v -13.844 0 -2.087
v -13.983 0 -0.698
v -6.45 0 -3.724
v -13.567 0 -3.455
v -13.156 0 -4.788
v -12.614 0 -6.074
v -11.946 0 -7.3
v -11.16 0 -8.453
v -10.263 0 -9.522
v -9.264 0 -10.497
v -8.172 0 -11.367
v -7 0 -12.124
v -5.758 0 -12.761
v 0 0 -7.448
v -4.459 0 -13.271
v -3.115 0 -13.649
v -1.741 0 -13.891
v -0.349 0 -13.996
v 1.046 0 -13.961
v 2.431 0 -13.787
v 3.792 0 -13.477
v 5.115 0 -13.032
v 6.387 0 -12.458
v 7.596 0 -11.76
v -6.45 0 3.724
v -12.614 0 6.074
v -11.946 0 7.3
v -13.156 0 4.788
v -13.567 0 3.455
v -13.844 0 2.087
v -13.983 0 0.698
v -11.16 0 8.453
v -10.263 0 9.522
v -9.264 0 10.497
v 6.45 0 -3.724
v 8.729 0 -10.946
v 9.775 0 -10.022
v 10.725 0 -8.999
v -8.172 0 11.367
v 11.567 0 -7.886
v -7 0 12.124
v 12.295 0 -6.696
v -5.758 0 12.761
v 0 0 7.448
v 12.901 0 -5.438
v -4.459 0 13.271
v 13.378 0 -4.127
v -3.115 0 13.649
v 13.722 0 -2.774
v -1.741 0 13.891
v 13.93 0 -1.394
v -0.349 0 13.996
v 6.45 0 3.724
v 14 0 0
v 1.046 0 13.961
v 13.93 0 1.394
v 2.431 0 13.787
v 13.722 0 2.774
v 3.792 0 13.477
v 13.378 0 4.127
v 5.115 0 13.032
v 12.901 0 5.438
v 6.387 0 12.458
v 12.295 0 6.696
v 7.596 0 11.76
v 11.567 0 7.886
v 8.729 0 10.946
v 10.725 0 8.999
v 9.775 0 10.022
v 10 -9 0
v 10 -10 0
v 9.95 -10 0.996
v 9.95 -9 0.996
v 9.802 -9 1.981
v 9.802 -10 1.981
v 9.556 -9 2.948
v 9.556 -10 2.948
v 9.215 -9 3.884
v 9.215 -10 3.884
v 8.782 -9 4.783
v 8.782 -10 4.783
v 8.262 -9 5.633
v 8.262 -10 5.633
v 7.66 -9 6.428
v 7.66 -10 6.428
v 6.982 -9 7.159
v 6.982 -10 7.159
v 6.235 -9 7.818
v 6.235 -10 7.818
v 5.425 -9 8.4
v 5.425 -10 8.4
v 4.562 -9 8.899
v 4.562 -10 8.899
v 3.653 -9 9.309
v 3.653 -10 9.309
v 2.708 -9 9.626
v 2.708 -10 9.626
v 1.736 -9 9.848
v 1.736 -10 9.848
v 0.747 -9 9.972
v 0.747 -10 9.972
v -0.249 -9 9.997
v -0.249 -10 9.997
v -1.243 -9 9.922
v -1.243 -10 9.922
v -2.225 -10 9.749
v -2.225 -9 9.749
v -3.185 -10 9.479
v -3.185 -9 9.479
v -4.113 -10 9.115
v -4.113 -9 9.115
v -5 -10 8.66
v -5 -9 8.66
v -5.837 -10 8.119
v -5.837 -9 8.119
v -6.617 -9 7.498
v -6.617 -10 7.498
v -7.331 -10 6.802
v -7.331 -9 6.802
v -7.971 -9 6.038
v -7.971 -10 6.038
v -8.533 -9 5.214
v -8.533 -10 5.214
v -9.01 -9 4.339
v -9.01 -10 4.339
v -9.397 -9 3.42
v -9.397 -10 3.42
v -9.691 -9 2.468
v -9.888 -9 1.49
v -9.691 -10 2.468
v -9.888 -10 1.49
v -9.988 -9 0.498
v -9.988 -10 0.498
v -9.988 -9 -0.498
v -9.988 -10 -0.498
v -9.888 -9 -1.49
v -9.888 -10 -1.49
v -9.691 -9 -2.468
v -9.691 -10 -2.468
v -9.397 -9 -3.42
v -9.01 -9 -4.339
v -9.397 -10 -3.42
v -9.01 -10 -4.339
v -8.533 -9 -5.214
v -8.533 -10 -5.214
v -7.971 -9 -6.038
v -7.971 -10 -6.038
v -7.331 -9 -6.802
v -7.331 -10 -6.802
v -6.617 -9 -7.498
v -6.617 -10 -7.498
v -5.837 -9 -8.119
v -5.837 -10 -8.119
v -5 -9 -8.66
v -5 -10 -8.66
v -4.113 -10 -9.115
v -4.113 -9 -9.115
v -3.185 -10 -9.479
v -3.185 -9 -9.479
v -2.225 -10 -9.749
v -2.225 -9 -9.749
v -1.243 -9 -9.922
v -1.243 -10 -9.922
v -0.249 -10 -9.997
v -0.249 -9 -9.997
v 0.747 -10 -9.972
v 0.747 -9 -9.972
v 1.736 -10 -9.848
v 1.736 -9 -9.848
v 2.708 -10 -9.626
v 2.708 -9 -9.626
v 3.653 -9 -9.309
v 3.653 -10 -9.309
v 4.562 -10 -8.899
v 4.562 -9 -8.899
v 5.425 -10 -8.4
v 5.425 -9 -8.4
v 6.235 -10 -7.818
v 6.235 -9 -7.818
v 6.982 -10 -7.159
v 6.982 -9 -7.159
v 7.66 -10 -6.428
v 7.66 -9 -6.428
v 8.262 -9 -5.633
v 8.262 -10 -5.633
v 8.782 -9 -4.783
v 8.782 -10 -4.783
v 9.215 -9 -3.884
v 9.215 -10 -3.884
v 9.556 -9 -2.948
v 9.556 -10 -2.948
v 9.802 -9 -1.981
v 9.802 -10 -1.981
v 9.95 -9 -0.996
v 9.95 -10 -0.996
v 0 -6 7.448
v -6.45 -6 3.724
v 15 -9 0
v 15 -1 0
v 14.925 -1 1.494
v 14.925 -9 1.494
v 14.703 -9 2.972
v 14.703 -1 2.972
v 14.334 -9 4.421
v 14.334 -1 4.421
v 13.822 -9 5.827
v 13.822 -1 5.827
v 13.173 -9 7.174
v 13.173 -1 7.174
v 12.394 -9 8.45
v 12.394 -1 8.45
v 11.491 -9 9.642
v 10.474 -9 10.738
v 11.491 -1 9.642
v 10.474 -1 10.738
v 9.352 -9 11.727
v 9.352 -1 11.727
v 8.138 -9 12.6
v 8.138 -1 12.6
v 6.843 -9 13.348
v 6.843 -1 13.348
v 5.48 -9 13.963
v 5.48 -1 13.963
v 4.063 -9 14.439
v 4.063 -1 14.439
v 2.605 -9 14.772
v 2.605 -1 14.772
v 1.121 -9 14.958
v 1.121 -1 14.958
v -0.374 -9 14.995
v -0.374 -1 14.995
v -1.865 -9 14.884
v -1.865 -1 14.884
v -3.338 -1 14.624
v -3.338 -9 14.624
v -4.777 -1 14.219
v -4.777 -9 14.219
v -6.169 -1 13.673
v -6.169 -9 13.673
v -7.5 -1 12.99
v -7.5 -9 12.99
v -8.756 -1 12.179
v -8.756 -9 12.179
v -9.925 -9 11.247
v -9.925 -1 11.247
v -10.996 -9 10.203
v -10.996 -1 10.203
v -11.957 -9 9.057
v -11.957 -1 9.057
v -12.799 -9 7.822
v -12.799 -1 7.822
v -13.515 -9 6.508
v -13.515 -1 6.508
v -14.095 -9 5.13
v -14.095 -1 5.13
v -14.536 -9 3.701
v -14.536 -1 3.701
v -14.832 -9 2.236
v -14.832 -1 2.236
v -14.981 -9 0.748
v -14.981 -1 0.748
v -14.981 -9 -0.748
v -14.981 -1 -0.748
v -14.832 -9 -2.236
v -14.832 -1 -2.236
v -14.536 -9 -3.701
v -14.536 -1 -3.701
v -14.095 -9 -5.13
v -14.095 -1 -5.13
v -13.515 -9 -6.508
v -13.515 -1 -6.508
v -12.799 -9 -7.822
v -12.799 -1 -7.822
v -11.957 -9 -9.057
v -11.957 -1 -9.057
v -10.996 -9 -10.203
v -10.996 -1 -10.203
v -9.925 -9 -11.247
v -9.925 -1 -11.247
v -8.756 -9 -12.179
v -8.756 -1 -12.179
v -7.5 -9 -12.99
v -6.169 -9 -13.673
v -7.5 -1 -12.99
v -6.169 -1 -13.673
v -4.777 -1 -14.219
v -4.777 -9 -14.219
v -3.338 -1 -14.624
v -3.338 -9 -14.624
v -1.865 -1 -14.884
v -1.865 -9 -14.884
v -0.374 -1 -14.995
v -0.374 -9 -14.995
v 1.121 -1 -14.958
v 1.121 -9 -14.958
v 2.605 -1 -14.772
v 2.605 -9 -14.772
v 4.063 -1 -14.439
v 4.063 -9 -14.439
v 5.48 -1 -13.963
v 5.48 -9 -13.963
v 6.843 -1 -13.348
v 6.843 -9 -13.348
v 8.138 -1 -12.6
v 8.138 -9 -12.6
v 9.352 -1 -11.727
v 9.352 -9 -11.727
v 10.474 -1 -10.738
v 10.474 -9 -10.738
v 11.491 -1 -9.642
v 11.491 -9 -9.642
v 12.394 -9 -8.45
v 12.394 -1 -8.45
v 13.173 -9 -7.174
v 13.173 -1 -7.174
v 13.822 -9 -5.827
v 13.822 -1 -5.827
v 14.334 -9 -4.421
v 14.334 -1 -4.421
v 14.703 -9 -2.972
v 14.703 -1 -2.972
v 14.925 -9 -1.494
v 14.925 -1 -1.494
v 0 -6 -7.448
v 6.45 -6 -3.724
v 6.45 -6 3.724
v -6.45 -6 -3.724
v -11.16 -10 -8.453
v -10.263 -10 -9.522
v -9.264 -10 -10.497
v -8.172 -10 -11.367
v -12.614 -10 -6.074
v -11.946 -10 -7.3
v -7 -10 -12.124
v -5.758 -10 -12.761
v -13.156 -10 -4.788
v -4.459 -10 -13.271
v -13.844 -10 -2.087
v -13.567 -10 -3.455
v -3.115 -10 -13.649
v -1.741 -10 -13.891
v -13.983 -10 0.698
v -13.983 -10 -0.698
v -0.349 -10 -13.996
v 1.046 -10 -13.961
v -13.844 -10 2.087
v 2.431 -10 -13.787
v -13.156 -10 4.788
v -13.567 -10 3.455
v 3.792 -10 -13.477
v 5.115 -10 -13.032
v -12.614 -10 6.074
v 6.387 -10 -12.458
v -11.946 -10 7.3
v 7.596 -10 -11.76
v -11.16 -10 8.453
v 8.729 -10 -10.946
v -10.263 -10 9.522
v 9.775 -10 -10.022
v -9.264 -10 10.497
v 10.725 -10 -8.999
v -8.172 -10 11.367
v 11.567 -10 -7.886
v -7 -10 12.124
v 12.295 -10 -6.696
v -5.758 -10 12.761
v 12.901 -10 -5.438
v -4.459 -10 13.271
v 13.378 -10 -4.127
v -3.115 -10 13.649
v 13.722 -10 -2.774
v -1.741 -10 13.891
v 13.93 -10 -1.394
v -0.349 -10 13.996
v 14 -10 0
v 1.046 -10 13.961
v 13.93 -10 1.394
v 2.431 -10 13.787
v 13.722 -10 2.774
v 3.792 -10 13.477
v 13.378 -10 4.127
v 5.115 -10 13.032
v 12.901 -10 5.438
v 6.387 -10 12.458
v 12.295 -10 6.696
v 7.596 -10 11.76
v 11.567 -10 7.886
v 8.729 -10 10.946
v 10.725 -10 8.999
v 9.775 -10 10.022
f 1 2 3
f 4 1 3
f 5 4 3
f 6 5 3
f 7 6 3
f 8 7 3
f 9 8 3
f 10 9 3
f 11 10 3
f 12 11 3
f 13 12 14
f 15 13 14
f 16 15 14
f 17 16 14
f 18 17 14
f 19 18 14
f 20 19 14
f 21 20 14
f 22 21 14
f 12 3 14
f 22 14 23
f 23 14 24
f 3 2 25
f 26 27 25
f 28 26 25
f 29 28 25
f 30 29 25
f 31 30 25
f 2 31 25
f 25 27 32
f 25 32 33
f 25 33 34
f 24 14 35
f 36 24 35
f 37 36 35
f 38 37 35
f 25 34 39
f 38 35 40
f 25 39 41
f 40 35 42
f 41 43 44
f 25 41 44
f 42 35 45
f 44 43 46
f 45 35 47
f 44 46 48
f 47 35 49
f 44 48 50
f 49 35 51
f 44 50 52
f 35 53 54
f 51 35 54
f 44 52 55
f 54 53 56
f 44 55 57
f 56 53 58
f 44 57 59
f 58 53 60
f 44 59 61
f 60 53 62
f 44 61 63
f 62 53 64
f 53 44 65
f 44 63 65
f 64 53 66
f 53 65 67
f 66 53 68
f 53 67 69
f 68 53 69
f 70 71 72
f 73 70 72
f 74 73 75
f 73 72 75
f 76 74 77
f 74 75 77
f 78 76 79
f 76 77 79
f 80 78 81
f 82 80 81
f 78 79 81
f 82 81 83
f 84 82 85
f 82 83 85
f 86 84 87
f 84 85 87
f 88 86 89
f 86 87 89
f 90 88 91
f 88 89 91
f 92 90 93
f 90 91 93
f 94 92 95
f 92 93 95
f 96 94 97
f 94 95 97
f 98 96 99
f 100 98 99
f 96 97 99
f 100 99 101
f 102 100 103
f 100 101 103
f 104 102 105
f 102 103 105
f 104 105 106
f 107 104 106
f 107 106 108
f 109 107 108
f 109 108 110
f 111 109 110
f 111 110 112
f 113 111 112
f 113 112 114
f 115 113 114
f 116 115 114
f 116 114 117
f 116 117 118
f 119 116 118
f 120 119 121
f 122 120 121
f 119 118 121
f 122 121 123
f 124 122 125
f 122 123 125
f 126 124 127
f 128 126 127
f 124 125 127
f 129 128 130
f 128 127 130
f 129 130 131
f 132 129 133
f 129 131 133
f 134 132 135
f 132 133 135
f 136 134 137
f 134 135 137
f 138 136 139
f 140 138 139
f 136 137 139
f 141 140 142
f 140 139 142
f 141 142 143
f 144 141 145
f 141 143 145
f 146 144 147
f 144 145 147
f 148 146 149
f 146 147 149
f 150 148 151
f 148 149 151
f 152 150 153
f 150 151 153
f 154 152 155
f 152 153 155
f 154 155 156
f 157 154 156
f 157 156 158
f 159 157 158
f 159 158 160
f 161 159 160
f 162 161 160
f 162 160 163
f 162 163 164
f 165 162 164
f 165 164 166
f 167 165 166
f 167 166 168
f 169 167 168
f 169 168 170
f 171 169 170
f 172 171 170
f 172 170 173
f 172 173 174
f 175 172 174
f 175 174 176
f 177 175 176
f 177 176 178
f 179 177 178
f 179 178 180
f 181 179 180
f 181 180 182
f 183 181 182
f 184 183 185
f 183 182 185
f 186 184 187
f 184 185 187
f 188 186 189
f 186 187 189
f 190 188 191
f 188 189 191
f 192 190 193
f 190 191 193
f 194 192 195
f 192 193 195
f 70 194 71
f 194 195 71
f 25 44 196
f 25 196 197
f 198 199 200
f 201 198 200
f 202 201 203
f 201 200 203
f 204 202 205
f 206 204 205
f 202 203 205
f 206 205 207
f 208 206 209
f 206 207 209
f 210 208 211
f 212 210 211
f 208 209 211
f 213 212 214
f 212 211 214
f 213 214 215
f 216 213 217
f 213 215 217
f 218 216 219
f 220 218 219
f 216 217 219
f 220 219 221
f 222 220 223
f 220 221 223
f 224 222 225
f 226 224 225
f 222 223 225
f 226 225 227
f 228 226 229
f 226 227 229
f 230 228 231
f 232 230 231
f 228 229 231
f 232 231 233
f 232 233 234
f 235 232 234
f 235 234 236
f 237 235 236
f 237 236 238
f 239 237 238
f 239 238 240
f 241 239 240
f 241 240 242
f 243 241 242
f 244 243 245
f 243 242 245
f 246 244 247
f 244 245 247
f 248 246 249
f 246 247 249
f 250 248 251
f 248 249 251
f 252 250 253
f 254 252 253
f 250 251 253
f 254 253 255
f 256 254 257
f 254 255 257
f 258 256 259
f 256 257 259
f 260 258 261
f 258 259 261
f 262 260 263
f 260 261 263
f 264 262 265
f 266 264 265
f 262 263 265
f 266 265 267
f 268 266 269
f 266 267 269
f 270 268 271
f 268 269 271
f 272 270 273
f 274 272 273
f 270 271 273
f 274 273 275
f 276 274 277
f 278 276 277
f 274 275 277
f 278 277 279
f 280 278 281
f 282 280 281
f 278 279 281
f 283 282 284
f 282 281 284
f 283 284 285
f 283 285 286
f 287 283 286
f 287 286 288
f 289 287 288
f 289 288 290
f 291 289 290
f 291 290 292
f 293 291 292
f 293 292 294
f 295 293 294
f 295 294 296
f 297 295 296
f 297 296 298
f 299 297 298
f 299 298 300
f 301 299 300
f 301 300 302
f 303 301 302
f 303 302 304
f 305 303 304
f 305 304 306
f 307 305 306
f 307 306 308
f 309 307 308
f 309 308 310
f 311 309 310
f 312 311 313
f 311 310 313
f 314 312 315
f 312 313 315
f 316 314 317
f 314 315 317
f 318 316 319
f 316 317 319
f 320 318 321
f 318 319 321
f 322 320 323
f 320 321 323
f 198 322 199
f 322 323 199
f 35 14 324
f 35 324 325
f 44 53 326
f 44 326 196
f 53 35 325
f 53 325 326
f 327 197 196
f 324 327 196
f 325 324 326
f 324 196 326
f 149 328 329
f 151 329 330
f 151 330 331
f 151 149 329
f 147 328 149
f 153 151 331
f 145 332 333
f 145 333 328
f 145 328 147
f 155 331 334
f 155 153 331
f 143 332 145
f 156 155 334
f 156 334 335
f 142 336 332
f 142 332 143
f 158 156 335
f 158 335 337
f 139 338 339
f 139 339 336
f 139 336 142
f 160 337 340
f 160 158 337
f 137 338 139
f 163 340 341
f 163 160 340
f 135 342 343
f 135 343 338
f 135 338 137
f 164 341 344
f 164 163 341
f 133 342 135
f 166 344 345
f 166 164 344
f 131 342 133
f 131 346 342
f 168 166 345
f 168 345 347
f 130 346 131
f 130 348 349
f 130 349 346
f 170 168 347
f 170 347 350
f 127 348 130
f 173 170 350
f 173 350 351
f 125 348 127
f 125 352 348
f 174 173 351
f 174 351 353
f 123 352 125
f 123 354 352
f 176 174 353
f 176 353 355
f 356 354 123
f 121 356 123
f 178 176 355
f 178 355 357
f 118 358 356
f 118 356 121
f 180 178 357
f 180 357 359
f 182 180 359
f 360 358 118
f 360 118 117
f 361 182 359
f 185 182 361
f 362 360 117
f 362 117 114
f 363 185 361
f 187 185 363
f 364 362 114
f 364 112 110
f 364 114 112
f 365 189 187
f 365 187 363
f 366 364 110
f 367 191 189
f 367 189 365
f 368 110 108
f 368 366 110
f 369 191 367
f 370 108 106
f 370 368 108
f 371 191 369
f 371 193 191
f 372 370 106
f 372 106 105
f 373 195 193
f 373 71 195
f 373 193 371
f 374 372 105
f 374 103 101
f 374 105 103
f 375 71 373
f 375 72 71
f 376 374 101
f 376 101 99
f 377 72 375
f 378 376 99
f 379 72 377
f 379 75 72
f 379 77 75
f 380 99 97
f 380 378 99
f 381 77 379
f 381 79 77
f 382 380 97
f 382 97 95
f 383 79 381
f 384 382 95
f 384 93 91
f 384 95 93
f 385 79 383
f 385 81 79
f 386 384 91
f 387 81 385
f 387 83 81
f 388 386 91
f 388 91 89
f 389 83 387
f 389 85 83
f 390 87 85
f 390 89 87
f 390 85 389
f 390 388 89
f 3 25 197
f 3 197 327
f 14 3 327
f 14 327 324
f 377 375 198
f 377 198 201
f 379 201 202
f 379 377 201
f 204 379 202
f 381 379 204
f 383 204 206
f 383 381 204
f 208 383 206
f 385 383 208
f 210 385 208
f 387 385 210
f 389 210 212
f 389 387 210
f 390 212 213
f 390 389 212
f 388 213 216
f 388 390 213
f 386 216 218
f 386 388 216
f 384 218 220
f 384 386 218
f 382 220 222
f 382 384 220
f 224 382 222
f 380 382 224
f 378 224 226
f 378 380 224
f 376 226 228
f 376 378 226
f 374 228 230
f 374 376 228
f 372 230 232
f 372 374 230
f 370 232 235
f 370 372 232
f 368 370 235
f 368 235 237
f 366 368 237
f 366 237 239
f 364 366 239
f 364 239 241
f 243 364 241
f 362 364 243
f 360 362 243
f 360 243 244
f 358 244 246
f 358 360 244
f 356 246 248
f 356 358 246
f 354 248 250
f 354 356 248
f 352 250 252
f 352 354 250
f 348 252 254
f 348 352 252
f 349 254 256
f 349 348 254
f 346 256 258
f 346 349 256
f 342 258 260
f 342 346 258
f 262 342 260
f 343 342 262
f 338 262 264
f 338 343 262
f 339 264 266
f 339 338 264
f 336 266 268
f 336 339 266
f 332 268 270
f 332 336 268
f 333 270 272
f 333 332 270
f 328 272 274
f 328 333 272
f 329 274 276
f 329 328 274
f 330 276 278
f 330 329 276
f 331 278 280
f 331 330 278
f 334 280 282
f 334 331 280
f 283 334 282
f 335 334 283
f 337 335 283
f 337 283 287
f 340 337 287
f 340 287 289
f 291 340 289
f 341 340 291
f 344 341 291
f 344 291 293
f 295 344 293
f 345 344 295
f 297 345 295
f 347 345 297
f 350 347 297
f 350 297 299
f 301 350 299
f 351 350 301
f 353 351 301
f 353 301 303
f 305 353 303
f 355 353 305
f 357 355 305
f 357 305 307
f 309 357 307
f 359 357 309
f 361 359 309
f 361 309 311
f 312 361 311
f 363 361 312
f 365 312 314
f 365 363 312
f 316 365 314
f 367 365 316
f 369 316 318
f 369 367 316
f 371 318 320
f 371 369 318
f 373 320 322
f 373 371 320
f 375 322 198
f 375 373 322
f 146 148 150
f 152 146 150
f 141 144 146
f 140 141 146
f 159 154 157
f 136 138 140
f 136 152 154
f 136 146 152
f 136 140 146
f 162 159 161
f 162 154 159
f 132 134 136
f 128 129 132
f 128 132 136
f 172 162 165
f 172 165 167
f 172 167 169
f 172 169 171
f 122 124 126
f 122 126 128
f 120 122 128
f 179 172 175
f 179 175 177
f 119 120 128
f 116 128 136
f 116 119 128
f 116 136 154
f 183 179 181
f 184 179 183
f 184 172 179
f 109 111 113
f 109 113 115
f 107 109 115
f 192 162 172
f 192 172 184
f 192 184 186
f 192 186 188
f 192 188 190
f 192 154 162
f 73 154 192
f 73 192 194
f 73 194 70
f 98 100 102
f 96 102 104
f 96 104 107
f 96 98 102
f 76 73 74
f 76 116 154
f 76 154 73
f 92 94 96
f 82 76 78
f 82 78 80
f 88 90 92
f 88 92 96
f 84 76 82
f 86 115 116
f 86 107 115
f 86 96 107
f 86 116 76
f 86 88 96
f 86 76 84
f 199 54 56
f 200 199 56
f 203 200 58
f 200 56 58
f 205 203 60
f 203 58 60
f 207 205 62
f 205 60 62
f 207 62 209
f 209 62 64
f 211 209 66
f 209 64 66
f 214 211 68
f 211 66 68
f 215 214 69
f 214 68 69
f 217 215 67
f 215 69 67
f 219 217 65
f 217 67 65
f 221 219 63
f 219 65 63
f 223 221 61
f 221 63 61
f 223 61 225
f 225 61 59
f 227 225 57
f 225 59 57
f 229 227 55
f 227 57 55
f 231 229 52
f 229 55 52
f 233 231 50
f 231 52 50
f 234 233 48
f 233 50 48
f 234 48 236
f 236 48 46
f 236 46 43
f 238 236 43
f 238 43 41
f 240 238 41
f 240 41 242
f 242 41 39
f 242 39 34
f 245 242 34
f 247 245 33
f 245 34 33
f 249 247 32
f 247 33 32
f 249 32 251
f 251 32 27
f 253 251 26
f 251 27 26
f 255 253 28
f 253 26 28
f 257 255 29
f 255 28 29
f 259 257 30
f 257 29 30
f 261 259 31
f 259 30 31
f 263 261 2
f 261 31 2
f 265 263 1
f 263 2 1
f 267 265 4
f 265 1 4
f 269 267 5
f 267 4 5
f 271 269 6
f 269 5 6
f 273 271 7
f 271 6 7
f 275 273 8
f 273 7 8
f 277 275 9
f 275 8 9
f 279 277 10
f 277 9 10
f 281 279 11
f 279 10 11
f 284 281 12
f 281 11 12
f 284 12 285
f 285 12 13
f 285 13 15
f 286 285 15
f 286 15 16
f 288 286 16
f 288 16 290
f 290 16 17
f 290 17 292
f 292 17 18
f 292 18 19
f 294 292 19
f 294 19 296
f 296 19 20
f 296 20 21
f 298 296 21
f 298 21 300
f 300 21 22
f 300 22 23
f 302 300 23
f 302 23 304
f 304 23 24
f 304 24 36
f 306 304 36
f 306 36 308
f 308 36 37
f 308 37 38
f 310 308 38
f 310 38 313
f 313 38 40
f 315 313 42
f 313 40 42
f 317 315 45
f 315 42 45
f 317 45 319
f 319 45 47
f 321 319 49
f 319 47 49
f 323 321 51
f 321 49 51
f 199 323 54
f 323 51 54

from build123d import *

# Parameters (mm, degrees)
SKETCH_R        = 15
PAD_DEPTH       = 10
POCKET_DEPTH    = 6
SKETCH002_R     = 10
POCKET001_DEPTH = 1
CHAMFER_SIZE    = 1


with BuildPart() as part:
    # Sketch → Pad (new body)
    with BuildSketch(Plane.XZ):
        Circle(SKETCH_R)
    extrude(amount=PAD_DEPTH)

    # Sketch001 → Pocket (cut)
    with BuildSketch(Plane.XZ):
        Polygon((6.45, -3.723909), (6.45, 3.723909), (0, 7.447818), (-6.45, 3.723909), (-6.45, -3.723909), (0, -7.447818), align=None)
    extrude(amount=POCKET_DEPTH, mode=Mode.SUBTRACT)

    # Sketch002 (on Face3 of Pocket) → Pocket001 (cut)
    with BuildSketch(Plane.XZ.offset(10)):
        Circle(SKETCH002_R)
    extrude(amount=-POCKET001_DEPTH, mode=Mode.SUBTRACT)

    # Chamfer
    chamfer_edges = [part.edges().sort_by_distance(p)[0] for p in [
        (-15, -10, 0),
        (-15, 0, 0),
    ]]
    chamfer(chamfer_edges, length=CHAMFER_SIZE)


solid = part.part
